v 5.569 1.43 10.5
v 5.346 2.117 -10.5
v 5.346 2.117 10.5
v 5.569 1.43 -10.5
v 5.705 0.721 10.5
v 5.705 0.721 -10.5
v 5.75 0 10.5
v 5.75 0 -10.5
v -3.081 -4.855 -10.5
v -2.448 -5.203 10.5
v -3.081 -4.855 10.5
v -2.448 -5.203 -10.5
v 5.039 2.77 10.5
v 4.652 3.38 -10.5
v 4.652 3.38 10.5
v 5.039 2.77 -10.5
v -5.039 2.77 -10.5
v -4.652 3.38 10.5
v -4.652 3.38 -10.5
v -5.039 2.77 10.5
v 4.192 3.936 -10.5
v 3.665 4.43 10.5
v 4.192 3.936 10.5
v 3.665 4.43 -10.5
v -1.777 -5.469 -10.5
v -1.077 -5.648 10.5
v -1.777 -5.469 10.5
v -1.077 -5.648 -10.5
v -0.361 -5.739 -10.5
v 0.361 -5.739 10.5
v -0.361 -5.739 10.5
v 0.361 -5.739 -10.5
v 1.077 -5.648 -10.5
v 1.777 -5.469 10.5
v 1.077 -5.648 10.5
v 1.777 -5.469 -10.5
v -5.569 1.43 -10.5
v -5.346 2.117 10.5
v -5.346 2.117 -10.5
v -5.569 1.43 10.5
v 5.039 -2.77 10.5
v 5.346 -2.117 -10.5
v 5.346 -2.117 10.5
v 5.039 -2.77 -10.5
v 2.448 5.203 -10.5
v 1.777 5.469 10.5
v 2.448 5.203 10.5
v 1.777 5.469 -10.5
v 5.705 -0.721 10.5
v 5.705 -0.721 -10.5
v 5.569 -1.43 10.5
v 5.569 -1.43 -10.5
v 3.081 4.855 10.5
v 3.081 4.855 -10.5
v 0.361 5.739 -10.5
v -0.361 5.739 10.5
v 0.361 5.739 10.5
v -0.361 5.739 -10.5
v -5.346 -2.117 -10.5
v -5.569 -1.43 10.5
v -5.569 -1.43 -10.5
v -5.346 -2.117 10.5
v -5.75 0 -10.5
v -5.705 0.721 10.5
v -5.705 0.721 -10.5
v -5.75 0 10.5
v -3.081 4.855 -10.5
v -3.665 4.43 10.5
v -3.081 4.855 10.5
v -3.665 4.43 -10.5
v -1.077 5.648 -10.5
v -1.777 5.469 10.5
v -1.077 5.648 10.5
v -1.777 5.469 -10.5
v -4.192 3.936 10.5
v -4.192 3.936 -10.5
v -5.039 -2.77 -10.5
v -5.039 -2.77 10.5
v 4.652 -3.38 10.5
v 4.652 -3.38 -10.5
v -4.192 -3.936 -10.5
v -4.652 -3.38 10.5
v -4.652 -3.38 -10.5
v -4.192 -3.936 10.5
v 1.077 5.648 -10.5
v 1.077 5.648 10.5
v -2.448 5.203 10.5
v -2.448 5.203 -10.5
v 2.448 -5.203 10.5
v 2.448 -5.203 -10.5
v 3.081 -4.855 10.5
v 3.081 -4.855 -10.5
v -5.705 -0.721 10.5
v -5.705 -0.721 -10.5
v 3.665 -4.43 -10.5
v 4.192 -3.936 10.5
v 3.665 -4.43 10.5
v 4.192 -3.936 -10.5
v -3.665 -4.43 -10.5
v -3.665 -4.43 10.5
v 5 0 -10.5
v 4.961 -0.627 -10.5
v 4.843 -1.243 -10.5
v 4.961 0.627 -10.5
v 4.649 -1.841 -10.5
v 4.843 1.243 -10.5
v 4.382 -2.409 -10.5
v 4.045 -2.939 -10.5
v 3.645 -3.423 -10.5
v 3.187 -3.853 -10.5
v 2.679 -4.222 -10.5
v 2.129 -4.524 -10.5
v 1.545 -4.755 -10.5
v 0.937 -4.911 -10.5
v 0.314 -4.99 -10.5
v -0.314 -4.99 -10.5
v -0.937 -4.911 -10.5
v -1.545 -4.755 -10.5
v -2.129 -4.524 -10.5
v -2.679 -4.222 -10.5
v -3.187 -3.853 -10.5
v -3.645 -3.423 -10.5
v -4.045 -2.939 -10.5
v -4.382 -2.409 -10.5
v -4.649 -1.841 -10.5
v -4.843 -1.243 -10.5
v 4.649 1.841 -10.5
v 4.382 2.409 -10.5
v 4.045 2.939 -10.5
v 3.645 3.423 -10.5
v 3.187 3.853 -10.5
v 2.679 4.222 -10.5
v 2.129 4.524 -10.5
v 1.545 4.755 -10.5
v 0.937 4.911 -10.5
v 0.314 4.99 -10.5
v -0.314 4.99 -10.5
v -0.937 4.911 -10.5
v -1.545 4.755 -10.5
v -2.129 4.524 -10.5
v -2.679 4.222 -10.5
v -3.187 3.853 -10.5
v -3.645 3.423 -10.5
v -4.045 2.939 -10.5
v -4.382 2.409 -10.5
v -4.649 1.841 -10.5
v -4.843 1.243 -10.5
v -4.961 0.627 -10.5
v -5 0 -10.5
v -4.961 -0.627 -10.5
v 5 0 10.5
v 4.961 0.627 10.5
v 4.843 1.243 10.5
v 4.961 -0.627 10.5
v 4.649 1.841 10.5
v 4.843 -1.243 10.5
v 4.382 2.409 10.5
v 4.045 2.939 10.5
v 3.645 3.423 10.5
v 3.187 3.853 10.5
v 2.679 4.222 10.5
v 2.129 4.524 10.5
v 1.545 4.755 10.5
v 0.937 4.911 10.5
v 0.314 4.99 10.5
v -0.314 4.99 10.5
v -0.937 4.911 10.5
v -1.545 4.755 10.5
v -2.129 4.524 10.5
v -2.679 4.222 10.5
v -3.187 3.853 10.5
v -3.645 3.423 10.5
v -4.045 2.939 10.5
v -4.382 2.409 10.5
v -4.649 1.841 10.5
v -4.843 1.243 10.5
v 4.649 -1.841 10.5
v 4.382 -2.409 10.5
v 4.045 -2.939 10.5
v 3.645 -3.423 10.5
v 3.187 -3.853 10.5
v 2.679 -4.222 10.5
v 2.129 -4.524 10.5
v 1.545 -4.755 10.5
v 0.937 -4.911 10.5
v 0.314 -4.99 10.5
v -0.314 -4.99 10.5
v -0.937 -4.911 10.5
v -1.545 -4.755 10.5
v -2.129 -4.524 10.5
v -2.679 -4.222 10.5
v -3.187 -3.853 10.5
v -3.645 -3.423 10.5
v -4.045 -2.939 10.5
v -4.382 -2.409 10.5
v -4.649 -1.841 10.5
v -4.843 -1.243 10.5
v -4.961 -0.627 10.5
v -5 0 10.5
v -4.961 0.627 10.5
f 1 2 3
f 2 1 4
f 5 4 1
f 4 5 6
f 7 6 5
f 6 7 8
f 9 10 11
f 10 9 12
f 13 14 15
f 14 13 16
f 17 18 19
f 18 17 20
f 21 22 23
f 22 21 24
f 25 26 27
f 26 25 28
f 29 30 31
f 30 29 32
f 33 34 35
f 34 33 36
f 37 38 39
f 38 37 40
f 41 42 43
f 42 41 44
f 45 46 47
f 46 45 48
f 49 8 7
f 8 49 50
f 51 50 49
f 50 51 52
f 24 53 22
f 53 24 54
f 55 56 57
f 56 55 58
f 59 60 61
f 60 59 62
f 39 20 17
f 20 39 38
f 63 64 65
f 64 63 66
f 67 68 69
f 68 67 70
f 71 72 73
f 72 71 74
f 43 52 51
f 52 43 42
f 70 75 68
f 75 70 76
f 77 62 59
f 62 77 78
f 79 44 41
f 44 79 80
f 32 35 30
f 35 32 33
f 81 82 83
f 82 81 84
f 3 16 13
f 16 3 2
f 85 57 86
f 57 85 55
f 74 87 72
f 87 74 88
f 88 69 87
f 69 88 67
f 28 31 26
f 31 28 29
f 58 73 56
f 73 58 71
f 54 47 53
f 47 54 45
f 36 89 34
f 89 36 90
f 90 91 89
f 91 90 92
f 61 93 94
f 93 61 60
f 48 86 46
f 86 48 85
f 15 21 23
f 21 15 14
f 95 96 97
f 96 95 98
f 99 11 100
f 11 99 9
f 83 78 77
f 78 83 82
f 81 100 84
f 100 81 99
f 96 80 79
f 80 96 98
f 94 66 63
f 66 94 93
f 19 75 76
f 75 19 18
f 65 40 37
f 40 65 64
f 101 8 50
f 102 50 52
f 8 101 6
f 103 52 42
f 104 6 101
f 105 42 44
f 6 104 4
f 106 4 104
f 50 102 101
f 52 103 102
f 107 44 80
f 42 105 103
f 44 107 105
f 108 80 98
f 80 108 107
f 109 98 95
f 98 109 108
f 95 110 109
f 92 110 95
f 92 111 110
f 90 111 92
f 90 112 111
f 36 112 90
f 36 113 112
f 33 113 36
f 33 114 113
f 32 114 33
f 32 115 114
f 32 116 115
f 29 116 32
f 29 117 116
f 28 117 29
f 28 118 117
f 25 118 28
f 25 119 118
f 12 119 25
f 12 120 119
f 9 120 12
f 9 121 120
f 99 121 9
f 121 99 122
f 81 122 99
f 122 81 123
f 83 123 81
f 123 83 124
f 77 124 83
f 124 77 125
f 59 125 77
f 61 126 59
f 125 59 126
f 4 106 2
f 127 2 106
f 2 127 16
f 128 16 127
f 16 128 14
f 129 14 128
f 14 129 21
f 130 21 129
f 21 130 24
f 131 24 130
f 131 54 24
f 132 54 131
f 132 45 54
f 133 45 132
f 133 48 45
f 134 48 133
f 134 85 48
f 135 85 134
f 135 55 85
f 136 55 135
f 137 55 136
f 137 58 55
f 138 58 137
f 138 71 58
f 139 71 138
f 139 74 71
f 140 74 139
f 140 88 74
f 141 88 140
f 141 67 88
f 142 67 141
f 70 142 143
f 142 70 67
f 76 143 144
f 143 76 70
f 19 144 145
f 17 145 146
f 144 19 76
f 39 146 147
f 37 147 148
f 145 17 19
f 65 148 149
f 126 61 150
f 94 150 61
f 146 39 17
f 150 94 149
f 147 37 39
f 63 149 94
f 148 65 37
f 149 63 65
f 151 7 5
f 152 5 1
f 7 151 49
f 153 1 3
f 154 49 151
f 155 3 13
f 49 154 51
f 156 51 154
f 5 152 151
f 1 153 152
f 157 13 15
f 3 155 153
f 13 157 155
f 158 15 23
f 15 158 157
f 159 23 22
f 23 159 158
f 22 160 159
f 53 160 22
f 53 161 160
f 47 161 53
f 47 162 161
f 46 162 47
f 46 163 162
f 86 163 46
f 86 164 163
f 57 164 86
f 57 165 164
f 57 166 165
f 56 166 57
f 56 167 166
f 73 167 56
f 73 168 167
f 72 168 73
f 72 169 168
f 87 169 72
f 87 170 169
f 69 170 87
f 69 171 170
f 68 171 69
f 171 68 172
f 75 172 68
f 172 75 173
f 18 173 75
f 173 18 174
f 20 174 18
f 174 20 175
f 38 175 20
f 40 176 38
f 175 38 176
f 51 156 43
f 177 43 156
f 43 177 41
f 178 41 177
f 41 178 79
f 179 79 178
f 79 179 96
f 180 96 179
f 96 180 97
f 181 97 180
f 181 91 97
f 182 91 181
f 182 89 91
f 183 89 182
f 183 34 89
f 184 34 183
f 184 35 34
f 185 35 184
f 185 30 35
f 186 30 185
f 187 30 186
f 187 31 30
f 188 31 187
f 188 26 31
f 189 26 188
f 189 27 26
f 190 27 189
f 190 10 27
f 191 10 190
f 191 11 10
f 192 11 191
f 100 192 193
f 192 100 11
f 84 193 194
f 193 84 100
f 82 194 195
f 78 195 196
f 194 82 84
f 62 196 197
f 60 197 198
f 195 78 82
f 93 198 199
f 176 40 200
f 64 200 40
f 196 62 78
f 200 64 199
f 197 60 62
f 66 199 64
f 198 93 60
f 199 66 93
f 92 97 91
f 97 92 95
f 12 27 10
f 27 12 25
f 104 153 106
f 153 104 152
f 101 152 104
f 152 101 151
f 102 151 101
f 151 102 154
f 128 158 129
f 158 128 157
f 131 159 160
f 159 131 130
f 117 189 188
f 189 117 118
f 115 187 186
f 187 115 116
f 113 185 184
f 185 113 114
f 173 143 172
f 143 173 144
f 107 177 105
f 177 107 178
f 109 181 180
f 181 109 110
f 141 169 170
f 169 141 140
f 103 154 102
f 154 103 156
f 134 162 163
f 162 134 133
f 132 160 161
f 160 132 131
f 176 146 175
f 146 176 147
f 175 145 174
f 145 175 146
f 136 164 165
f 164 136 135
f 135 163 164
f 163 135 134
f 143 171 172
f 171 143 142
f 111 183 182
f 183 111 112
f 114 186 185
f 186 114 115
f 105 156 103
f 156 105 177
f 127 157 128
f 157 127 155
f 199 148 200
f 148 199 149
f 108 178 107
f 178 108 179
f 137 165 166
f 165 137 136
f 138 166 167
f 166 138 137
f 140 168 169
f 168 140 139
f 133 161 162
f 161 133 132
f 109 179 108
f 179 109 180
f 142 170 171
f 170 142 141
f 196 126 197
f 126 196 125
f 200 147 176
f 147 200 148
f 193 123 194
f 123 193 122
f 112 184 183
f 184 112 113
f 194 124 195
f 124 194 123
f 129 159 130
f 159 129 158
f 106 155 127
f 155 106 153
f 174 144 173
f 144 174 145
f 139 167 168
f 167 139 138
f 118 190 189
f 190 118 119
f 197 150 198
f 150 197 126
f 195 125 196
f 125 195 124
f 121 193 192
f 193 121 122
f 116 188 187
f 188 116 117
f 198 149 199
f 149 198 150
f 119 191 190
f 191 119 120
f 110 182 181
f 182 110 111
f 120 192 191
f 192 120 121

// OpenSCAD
$fn = 50;


difference() {
	union() {
		translate(v = [0, 0, -10.5000000000]) {
			cylinder(h = 21, r = 5.7500000000);
		}
	}
	union() {
		translate(v = [0, 0, -100.0000000000]) {
			cylinder(h = 200, r = 5.0000000000);
		}
	}
}
